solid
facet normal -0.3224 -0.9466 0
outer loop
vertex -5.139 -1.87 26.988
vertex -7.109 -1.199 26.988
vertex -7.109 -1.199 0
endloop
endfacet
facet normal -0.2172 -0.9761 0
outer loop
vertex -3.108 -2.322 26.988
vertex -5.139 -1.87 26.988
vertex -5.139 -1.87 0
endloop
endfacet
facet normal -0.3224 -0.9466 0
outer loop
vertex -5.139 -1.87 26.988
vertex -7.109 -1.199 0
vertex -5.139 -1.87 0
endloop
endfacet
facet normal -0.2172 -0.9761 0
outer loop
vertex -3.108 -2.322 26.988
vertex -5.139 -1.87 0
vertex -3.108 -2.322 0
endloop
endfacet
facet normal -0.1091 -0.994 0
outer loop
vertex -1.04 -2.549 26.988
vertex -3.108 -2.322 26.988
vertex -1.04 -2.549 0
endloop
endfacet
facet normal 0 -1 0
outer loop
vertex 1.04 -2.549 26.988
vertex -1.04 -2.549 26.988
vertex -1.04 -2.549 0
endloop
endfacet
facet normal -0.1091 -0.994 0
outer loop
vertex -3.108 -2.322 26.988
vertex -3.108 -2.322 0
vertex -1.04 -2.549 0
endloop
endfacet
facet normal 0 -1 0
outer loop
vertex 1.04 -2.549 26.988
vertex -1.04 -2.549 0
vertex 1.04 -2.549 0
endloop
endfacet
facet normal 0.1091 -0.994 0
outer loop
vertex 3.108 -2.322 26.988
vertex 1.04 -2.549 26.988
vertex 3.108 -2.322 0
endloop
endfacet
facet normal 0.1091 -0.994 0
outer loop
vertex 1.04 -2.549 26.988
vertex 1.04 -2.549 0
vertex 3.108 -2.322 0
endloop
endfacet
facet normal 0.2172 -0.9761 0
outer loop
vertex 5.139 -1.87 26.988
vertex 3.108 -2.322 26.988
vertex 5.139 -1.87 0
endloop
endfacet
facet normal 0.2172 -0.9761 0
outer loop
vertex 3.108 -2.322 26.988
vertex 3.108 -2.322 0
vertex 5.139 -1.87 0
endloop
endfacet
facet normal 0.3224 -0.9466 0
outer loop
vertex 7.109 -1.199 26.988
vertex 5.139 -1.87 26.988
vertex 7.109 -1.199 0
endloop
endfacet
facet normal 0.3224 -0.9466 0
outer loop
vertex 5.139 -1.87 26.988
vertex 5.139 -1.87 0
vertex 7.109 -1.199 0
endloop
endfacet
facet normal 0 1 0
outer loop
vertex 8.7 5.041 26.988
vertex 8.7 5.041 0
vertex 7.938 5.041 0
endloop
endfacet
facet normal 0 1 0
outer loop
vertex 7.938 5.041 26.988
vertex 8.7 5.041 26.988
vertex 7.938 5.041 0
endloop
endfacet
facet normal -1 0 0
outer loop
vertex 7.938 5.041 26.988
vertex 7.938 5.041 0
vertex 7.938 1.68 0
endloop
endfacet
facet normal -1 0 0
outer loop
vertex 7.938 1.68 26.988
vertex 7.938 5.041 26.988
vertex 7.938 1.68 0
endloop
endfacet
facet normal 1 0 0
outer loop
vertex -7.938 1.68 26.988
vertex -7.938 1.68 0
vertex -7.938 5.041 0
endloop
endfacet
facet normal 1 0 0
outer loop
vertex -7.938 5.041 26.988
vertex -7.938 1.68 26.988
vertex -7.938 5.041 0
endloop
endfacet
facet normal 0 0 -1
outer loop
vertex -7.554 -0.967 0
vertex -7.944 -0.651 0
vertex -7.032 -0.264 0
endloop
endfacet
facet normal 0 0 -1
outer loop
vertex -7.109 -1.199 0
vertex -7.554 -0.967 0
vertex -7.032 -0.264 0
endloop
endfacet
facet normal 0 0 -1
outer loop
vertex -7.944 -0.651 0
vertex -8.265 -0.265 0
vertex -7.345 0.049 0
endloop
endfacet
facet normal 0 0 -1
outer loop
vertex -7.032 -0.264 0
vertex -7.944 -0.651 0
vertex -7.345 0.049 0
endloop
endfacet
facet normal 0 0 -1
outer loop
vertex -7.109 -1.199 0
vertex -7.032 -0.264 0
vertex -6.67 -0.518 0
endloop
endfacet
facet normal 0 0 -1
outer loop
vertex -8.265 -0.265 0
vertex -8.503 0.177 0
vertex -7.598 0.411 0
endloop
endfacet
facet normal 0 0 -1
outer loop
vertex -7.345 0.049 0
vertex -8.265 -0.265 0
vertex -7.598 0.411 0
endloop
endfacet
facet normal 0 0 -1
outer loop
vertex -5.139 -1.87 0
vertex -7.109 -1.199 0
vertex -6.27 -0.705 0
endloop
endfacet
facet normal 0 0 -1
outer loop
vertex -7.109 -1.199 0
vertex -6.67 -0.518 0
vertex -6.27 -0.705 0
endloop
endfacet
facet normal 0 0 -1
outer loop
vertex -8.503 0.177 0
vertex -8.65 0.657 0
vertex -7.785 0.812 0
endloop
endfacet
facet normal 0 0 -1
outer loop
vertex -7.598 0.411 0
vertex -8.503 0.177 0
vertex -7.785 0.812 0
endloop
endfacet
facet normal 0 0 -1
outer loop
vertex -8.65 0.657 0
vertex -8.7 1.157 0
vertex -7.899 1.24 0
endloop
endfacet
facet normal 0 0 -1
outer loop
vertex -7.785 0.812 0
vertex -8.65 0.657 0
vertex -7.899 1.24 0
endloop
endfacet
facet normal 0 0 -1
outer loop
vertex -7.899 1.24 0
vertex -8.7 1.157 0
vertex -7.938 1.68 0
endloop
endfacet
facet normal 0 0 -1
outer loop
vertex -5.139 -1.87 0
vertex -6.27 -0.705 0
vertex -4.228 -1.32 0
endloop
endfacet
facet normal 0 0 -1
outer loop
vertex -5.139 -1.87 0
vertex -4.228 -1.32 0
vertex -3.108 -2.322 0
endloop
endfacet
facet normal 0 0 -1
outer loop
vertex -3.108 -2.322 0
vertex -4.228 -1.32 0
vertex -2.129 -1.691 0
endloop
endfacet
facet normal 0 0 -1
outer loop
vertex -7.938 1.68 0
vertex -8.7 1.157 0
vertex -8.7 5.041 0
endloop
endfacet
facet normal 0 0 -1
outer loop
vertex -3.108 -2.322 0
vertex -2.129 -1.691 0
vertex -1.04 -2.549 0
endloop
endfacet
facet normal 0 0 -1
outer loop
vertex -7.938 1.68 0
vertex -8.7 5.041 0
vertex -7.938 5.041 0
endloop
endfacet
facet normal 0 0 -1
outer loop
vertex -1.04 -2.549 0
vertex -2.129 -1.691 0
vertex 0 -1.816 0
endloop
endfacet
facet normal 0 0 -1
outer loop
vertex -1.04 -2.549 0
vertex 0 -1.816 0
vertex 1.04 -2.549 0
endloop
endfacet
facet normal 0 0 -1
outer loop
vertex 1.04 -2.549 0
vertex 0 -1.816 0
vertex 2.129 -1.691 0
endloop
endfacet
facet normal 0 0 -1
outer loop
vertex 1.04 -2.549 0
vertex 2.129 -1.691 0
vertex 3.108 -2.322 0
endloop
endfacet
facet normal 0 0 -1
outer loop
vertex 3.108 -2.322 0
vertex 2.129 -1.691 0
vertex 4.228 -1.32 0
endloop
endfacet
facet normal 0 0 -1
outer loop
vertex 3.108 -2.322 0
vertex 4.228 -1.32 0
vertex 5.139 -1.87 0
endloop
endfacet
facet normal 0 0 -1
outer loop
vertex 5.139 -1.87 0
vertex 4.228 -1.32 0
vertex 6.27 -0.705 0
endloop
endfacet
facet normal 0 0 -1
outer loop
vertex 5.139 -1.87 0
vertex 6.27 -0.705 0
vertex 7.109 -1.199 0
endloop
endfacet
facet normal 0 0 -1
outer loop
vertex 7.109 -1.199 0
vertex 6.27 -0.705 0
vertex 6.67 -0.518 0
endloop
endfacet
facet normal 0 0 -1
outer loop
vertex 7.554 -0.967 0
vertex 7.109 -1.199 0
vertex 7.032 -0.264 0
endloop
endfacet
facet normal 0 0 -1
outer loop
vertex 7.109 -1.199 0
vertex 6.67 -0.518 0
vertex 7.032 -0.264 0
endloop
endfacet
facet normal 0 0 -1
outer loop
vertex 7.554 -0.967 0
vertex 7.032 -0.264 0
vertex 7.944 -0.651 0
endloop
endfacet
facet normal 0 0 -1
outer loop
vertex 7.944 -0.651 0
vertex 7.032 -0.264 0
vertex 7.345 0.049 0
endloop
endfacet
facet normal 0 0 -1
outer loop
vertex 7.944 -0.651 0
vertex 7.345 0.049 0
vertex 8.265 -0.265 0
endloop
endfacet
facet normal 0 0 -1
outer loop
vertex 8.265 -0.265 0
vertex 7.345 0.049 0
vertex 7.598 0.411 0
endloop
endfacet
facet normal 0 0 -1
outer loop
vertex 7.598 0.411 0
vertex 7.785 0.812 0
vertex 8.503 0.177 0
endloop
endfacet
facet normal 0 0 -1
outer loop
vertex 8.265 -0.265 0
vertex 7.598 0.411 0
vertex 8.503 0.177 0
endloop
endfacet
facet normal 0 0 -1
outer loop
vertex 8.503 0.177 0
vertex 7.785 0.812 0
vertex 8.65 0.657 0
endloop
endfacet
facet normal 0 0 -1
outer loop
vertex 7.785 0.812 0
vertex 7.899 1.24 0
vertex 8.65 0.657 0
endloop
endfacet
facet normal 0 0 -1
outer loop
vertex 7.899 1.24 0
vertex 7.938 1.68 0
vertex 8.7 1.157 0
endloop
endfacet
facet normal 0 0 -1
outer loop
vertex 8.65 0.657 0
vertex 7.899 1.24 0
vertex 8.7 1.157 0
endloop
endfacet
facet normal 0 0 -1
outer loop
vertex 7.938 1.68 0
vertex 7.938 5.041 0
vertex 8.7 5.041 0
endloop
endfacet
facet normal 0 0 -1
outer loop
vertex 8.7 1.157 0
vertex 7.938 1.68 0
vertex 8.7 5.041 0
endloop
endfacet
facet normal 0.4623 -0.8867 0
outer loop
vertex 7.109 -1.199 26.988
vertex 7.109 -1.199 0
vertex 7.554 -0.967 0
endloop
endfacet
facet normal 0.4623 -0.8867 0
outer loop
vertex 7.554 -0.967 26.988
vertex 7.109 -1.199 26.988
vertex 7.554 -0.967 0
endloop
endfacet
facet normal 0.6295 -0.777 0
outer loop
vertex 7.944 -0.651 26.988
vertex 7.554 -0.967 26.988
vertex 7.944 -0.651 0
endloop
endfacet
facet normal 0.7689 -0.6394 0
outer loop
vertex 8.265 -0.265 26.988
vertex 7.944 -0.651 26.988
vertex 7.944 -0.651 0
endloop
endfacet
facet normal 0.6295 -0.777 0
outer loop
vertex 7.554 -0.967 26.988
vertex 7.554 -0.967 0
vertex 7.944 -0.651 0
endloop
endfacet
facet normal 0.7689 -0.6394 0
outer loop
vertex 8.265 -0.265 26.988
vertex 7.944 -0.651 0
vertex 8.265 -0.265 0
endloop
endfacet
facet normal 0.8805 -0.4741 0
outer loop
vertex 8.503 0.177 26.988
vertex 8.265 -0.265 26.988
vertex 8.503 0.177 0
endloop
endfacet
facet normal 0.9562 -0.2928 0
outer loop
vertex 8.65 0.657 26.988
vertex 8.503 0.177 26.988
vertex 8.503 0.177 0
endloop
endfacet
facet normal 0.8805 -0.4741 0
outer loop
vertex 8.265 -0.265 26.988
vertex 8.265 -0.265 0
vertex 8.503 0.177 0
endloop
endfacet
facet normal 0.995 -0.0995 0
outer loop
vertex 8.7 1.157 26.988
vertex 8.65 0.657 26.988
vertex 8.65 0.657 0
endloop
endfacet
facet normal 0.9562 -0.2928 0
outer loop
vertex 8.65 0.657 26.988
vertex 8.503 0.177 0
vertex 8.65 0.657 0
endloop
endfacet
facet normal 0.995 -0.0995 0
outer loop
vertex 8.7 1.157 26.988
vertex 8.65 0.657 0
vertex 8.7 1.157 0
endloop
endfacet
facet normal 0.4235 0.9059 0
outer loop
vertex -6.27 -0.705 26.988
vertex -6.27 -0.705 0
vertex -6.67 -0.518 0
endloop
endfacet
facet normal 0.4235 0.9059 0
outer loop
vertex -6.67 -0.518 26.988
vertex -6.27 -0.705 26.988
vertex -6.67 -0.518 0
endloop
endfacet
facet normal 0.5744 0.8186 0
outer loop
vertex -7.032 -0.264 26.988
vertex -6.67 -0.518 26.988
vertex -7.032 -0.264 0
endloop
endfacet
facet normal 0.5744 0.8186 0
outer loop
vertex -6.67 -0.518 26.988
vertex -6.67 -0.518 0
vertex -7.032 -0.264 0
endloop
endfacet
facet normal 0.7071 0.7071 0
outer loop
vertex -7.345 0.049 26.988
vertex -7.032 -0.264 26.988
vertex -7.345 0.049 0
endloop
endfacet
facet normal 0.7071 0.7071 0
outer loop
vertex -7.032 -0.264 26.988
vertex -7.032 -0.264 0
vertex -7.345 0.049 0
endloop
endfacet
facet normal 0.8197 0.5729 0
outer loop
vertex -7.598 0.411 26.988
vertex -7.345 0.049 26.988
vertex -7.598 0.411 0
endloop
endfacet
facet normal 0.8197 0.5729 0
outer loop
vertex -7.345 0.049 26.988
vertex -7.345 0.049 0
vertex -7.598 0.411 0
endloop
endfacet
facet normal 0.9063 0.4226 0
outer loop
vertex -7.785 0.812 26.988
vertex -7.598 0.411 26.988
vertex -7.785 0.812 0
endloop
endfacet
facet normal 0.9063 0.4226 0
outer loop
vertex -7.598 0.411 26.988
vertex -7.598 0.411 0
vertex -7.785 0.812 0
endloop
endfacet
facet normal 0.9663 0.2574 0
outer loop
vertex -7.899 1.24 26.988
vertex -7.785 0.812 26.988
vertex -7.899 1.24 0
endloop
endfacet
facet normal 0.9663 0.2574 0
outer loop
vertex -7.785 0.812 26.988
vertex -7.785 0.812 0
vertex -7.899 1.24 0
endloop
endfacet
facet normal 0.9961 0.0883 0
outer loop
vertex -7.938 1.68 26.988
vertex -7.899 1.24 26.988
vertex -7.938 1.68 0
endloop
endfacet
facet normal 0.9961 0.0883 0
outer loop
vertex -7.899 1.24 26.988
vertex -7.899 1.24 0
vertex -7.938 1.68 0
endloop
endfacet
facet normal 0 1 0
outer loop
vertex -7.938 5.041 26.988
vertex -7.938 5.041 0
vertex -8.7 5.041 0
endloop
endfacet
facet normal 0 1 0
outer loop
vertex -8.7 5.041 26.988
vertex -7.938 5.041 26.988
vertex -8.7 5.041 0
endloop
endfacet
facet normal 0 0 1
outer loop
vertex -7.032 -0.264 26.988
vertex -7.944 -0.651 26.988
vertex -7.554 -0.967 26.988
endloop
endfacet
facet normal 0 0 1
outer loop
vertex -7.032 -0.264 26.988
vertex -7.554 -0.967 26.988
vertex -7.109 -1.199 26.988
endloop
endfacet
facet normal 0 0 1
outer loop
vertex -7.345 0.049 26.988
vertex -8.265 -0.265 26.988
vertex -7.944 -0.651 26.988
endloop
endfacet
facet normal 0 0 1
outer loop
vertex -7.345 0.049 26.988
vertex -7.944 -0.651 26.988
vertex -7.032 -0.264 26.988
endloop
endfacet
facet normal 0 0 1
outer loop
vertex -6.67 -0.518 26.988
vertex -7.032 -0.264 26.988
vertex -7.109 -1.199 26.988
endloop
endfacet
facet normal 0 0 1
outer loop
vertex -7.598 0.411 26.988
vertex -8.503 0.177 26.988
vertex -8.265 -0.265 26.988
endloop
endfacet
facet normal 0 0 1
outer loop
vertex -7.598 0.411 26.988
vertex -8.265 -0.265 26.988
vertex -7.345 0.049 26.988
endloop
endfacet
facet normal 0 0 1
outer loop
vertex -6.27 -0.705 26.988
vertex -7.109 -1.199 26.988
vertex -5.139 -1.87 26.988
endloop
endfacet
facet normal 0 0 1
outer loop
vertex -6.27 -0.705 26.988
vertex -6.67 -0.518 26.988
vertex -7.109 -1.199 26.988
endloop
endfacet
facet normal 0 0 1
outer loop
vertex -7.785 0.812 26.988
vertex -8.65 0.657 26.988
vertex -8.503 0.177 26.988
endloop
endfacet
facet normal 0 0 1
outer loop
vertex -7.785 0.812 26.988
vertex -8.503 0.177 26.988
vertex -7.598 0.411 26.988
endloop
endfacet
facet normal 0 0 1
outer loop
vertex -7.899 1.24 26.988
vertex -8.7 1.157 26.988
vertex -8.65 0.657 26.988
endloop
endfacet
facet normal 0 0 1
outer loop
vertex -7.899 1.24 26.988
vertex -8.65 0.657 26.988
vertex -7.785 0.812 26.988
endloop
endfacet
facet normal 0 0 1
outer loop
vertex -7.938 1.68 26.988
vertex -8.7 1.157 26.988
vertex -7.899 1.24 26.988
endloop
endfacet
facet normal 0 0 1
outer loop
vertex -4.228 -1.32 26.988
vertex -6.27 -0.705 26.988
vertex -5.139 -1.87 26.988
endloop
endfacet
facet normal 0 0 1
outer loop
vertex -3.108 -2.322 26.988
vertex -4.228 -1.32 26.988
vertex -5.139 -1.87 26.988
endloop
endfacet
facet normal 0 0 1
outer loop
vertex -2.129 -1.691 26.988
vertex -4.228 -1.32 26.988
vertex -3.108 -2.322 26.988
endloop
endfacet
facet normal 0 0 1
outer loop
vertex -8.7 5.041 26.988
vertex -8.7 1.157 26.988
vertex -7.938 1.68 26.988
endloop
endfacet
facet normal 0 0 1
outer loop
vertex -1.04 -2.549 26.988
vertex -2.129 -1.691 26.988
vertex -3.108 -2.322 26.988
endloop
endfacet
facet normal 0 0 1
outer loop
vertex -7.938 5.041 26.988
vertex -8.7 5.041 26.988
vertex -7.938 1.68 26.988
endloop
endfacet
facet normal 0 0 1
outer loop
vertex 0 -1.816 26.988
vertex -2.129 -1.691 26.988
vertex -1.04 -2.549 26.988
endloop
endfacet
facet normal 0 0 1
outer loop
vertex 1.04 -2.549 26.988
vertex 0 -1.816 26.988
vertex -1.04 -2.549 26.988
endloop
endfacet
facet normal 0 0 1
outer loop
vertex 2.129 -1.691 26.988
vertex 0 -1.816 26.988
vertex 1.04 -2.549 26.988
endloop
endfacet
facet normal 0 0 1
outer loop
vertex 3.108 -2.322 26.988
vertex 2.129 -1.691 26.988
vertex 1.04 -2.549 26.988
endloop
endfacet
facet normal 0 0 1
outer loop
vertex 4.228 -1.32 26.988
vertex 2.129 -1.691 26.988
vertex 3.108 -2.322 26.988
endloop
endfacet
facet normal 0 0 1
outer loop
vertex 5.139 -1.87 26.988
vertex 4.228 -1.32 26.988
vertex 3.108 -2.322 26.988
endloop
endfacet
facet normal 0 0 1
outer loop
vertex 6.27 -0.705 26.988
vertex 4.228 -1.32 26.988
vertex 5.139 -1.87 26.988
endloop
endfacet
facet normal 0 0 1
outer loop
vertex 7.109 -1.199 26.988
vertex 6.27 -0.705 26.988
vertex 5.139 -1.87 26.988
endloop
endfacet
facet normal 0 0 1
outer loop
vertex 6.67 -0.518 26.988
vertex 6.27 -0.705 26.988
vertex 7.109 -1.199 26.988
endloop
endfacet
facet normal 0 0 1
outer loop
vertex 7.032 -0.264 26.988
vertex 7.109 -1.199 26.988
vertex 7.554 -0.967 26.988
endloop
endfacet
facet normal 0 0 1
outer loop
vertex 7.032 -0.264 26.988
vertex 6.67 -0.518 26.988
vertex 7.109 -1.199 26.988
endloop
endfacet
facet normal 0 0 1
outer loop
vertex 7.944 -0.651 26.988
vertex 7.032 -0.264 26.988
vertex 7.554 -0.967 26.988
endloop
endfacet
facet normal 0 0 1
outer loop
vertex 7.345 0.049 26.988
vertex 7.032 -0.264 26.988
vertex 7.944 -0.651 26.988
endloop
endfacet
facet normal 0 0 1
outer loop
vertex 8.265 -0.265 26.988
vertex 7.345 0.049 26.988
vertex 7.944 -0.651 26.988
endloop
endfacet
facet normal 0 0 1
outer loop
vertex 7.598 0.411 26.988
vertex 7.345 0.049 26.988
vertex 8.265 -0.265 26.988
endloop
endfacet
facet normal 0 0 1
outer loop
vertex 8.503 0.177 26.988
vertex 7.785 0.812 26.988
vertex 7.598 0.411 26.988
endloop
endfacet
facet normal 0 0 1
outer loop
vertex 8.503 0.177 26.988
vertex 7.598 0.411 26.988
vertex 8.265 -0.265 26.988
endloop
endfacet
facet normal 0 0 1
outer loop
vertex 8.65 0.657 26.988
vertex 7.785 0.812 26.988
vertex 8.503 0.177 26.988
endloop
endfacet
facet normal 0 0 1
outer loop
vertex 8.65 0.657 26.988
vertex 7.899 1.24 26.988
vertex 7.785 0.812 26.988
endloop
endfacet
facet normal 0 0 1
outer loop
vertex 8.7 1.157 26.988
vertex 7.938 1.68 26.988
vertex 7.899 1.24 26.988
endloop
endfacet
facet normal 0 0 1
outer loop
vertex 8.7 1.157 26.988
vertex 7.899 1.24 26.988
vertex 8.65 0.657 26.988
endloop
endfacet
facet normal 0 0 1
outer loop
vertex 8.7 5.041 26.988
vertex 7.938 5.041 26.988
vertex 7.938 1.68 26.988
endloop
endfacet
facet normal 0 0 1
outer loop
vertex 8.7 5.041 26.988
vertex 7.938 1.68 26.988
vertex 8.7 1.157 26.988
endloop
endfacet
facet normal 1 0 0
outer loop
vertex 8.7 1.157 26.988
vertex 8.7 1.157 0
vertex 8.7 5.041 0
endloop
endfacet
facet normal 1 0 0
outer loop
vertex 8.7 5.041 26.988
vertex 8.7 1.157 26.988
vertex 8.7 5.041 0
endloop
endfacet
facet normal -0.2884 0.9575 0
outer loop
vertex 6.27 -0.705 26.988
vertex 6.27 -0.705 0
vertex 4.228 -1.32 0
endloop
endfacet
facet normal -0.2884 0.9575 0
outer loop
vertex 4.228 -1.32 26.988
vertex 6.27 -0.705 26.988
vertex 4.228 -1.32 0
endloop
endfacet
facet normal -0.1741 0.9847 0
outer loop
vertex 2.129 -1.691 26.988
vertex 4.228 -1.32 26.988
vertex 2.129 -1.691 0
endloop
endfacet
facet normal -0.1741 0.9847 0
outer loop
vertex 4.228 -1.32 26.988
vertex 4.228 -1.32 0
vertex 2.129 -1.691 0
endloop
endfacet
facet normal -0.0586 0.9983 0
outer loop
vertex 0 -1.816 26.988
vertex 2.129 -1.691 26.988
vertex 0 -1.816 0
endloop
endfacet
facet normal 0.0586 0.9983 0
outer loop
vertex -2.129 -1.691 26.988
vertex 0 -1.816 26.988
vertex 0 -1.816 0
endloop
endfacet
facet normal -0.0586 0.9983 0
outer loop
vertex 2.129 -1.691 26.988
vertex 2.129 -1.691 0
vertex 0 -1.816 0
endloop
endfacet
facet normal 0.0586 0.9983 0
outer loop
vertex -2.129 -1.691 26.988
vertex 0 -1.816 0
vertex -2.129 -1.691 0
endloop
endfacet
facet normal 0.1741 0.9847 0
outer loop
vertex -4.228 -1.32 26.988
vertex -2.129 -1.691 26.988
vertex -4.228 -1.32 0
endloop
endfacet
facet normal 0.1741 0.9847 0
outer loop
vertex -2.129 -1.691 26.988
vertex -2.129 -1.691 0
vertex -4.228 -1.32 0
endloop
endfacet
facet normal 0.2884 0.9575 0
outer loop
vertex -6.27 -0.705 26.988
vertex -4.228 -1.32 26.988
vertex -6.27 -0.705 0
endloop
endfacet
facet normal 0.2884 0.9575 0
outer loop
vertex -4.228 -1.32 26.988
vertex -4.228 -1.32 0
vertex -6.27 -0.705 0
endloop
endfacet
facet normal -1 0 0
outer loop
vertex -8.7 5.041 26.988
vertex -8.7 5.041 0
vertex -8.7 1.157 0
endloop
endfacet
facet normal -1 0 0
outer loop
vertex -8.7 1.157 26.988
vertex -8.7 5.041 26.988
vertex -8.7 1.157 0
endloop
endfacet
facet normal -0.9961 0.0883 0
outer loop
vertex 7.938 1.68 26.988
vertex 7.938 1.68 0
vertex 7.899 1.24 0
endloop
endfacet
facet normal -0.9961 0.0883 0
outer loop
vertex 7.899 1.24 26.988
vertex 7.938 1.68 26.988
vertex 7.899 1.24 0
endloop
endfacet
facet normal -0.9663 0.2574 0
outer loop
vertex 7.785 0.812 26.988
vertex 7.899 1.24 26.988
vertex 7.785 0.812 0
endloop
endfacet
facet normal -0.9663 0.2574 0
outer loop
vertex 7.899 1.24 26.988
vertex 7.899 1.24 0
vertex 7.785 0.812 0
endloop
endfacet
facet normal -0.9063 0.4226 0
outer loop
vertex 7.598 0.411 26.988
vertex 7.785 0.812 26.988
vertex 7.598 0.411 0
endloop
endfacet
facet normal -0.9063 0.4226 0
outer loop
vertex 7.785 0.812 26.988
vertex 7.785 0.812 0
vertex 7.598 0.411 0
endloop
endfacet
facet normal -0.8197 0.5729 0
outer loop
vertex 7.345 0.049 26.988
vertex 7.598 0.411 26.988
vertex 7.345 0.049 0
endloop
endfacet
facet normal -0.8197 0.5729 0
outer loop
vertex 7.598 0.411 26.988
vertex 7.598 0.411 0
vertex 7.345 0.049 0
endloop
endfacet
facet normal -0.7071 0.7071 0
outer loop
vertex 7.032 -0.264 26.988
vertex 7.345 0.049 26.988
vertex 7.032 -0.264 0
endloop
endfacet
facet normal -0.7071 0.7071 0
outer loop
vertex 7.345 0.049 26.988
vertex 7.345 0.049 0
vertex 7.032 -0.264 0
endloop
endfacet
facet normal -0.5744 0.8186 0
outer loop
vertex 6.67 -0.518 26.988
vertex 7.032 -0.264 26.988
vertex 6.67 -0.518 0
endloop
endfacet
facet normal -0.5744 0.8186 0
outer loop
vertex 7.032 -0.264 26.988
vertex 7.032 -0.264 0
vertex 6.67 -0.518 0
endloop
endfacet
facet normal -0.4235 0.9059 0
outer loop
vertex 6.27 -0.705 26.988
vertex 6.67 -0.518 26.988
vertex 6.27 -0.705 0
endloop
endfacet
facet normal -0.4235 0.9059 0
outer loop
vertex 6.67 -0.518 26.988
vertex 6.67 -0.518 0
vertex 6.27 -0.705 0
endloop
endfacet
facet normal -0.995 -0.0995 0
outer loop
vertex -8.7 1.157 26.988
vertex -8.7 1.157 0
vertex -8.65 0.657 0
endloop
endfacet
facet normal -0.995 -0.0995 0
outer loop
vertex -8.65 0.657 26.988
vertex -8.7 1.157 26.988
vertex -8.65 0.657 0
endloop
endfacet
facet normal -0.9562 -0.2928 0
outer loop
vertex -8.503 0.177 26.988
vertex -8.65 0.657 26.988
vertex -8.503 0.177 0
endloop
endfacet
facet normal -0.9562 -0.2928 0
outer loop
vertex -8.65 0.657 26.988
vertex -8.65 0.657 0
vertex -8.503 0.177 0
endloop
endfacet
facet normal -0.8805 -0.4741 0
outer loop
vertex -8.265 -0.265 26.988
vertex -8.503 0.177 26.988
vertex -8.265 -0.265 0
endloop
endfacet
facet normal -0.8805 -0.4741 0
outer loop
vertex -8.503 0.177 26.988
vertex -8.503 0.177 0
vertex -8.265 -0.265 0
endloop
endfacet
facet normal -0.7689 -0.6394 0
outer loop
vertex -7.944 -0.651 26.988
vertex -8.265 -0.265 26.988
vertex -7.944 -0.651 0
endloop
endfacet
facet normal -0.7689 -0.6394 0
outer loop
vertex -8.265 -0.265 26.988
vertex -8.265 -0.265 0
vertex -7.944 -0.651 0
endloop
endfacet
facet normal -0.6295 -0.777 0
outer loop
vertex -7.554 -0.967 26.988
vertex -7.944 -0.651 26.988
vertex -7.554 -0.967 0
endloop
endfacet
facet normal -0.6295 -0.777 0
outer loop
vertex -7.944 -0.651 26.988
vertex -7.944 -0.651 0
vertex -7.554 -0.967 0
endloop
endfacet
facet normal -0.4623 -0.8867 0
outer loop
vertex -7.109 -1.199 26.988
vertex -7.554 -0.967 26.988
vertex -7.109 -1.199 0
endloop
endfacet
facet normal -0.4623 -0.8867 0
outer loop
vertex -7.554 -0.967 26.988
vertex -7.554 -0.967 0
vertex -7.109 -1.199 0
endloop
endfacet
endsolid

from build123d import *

# Parameters (mm, degrees)
BOSS_EXTRUDE1_DEPTH = 26.9875


with BuildPart() as part:
    # Sketch3 → Boss-Extrude1 (new body)
    with BuildSketch(Plane.XY):
        with BuildLine():
            Line((7.9375, 5.04103367), (7.9375, 1.680064545))
            ThreePointArc((7.9375, 1.680064545), (7.47924218, 0.224746884), (6.269823232, -0.705444243))
            ThreePointArc((6.269823232, -0.705444243), (0, -1.815849828), (-6.269823232, -0.705444243))
            ThreePointArc((-6.269823232, -0.705444243), (-7.47924218, 0.224746884), (-7.9375, 1.680064545))
            Line((-7.9375, 1.680064545), (-7.9375, 5.04103367))
            Line((-7.9375, 5.04103367), (-8.6995, 5.04103367))
            Line((-8.6995, 5.04103367), (-8.6995, 1.15664138))
            ThreePointArc((-8.6995, 1.15664138), (-8.264634287, -0.26462905), (-7.108941233, -1.199236661))
            ThreePointArc((-7.108941233, -1.199236661), (0, -2.577849828), (7.108941233, -1.199236661))
            ThreePointArc((7.108941233, -1.199236661), (8.264634287, -0.26462905), (8.6995, 1.15664138))
            Line((8.6995, 1.15664138), (8.6995, 5.04103367))
            Line((8.6995, 5.04103367), (7.9375, 5.04103367))
        make_face()
    extrude(amount=BOSS_EXTRUDE1_DEPTH)


solid = part.part
